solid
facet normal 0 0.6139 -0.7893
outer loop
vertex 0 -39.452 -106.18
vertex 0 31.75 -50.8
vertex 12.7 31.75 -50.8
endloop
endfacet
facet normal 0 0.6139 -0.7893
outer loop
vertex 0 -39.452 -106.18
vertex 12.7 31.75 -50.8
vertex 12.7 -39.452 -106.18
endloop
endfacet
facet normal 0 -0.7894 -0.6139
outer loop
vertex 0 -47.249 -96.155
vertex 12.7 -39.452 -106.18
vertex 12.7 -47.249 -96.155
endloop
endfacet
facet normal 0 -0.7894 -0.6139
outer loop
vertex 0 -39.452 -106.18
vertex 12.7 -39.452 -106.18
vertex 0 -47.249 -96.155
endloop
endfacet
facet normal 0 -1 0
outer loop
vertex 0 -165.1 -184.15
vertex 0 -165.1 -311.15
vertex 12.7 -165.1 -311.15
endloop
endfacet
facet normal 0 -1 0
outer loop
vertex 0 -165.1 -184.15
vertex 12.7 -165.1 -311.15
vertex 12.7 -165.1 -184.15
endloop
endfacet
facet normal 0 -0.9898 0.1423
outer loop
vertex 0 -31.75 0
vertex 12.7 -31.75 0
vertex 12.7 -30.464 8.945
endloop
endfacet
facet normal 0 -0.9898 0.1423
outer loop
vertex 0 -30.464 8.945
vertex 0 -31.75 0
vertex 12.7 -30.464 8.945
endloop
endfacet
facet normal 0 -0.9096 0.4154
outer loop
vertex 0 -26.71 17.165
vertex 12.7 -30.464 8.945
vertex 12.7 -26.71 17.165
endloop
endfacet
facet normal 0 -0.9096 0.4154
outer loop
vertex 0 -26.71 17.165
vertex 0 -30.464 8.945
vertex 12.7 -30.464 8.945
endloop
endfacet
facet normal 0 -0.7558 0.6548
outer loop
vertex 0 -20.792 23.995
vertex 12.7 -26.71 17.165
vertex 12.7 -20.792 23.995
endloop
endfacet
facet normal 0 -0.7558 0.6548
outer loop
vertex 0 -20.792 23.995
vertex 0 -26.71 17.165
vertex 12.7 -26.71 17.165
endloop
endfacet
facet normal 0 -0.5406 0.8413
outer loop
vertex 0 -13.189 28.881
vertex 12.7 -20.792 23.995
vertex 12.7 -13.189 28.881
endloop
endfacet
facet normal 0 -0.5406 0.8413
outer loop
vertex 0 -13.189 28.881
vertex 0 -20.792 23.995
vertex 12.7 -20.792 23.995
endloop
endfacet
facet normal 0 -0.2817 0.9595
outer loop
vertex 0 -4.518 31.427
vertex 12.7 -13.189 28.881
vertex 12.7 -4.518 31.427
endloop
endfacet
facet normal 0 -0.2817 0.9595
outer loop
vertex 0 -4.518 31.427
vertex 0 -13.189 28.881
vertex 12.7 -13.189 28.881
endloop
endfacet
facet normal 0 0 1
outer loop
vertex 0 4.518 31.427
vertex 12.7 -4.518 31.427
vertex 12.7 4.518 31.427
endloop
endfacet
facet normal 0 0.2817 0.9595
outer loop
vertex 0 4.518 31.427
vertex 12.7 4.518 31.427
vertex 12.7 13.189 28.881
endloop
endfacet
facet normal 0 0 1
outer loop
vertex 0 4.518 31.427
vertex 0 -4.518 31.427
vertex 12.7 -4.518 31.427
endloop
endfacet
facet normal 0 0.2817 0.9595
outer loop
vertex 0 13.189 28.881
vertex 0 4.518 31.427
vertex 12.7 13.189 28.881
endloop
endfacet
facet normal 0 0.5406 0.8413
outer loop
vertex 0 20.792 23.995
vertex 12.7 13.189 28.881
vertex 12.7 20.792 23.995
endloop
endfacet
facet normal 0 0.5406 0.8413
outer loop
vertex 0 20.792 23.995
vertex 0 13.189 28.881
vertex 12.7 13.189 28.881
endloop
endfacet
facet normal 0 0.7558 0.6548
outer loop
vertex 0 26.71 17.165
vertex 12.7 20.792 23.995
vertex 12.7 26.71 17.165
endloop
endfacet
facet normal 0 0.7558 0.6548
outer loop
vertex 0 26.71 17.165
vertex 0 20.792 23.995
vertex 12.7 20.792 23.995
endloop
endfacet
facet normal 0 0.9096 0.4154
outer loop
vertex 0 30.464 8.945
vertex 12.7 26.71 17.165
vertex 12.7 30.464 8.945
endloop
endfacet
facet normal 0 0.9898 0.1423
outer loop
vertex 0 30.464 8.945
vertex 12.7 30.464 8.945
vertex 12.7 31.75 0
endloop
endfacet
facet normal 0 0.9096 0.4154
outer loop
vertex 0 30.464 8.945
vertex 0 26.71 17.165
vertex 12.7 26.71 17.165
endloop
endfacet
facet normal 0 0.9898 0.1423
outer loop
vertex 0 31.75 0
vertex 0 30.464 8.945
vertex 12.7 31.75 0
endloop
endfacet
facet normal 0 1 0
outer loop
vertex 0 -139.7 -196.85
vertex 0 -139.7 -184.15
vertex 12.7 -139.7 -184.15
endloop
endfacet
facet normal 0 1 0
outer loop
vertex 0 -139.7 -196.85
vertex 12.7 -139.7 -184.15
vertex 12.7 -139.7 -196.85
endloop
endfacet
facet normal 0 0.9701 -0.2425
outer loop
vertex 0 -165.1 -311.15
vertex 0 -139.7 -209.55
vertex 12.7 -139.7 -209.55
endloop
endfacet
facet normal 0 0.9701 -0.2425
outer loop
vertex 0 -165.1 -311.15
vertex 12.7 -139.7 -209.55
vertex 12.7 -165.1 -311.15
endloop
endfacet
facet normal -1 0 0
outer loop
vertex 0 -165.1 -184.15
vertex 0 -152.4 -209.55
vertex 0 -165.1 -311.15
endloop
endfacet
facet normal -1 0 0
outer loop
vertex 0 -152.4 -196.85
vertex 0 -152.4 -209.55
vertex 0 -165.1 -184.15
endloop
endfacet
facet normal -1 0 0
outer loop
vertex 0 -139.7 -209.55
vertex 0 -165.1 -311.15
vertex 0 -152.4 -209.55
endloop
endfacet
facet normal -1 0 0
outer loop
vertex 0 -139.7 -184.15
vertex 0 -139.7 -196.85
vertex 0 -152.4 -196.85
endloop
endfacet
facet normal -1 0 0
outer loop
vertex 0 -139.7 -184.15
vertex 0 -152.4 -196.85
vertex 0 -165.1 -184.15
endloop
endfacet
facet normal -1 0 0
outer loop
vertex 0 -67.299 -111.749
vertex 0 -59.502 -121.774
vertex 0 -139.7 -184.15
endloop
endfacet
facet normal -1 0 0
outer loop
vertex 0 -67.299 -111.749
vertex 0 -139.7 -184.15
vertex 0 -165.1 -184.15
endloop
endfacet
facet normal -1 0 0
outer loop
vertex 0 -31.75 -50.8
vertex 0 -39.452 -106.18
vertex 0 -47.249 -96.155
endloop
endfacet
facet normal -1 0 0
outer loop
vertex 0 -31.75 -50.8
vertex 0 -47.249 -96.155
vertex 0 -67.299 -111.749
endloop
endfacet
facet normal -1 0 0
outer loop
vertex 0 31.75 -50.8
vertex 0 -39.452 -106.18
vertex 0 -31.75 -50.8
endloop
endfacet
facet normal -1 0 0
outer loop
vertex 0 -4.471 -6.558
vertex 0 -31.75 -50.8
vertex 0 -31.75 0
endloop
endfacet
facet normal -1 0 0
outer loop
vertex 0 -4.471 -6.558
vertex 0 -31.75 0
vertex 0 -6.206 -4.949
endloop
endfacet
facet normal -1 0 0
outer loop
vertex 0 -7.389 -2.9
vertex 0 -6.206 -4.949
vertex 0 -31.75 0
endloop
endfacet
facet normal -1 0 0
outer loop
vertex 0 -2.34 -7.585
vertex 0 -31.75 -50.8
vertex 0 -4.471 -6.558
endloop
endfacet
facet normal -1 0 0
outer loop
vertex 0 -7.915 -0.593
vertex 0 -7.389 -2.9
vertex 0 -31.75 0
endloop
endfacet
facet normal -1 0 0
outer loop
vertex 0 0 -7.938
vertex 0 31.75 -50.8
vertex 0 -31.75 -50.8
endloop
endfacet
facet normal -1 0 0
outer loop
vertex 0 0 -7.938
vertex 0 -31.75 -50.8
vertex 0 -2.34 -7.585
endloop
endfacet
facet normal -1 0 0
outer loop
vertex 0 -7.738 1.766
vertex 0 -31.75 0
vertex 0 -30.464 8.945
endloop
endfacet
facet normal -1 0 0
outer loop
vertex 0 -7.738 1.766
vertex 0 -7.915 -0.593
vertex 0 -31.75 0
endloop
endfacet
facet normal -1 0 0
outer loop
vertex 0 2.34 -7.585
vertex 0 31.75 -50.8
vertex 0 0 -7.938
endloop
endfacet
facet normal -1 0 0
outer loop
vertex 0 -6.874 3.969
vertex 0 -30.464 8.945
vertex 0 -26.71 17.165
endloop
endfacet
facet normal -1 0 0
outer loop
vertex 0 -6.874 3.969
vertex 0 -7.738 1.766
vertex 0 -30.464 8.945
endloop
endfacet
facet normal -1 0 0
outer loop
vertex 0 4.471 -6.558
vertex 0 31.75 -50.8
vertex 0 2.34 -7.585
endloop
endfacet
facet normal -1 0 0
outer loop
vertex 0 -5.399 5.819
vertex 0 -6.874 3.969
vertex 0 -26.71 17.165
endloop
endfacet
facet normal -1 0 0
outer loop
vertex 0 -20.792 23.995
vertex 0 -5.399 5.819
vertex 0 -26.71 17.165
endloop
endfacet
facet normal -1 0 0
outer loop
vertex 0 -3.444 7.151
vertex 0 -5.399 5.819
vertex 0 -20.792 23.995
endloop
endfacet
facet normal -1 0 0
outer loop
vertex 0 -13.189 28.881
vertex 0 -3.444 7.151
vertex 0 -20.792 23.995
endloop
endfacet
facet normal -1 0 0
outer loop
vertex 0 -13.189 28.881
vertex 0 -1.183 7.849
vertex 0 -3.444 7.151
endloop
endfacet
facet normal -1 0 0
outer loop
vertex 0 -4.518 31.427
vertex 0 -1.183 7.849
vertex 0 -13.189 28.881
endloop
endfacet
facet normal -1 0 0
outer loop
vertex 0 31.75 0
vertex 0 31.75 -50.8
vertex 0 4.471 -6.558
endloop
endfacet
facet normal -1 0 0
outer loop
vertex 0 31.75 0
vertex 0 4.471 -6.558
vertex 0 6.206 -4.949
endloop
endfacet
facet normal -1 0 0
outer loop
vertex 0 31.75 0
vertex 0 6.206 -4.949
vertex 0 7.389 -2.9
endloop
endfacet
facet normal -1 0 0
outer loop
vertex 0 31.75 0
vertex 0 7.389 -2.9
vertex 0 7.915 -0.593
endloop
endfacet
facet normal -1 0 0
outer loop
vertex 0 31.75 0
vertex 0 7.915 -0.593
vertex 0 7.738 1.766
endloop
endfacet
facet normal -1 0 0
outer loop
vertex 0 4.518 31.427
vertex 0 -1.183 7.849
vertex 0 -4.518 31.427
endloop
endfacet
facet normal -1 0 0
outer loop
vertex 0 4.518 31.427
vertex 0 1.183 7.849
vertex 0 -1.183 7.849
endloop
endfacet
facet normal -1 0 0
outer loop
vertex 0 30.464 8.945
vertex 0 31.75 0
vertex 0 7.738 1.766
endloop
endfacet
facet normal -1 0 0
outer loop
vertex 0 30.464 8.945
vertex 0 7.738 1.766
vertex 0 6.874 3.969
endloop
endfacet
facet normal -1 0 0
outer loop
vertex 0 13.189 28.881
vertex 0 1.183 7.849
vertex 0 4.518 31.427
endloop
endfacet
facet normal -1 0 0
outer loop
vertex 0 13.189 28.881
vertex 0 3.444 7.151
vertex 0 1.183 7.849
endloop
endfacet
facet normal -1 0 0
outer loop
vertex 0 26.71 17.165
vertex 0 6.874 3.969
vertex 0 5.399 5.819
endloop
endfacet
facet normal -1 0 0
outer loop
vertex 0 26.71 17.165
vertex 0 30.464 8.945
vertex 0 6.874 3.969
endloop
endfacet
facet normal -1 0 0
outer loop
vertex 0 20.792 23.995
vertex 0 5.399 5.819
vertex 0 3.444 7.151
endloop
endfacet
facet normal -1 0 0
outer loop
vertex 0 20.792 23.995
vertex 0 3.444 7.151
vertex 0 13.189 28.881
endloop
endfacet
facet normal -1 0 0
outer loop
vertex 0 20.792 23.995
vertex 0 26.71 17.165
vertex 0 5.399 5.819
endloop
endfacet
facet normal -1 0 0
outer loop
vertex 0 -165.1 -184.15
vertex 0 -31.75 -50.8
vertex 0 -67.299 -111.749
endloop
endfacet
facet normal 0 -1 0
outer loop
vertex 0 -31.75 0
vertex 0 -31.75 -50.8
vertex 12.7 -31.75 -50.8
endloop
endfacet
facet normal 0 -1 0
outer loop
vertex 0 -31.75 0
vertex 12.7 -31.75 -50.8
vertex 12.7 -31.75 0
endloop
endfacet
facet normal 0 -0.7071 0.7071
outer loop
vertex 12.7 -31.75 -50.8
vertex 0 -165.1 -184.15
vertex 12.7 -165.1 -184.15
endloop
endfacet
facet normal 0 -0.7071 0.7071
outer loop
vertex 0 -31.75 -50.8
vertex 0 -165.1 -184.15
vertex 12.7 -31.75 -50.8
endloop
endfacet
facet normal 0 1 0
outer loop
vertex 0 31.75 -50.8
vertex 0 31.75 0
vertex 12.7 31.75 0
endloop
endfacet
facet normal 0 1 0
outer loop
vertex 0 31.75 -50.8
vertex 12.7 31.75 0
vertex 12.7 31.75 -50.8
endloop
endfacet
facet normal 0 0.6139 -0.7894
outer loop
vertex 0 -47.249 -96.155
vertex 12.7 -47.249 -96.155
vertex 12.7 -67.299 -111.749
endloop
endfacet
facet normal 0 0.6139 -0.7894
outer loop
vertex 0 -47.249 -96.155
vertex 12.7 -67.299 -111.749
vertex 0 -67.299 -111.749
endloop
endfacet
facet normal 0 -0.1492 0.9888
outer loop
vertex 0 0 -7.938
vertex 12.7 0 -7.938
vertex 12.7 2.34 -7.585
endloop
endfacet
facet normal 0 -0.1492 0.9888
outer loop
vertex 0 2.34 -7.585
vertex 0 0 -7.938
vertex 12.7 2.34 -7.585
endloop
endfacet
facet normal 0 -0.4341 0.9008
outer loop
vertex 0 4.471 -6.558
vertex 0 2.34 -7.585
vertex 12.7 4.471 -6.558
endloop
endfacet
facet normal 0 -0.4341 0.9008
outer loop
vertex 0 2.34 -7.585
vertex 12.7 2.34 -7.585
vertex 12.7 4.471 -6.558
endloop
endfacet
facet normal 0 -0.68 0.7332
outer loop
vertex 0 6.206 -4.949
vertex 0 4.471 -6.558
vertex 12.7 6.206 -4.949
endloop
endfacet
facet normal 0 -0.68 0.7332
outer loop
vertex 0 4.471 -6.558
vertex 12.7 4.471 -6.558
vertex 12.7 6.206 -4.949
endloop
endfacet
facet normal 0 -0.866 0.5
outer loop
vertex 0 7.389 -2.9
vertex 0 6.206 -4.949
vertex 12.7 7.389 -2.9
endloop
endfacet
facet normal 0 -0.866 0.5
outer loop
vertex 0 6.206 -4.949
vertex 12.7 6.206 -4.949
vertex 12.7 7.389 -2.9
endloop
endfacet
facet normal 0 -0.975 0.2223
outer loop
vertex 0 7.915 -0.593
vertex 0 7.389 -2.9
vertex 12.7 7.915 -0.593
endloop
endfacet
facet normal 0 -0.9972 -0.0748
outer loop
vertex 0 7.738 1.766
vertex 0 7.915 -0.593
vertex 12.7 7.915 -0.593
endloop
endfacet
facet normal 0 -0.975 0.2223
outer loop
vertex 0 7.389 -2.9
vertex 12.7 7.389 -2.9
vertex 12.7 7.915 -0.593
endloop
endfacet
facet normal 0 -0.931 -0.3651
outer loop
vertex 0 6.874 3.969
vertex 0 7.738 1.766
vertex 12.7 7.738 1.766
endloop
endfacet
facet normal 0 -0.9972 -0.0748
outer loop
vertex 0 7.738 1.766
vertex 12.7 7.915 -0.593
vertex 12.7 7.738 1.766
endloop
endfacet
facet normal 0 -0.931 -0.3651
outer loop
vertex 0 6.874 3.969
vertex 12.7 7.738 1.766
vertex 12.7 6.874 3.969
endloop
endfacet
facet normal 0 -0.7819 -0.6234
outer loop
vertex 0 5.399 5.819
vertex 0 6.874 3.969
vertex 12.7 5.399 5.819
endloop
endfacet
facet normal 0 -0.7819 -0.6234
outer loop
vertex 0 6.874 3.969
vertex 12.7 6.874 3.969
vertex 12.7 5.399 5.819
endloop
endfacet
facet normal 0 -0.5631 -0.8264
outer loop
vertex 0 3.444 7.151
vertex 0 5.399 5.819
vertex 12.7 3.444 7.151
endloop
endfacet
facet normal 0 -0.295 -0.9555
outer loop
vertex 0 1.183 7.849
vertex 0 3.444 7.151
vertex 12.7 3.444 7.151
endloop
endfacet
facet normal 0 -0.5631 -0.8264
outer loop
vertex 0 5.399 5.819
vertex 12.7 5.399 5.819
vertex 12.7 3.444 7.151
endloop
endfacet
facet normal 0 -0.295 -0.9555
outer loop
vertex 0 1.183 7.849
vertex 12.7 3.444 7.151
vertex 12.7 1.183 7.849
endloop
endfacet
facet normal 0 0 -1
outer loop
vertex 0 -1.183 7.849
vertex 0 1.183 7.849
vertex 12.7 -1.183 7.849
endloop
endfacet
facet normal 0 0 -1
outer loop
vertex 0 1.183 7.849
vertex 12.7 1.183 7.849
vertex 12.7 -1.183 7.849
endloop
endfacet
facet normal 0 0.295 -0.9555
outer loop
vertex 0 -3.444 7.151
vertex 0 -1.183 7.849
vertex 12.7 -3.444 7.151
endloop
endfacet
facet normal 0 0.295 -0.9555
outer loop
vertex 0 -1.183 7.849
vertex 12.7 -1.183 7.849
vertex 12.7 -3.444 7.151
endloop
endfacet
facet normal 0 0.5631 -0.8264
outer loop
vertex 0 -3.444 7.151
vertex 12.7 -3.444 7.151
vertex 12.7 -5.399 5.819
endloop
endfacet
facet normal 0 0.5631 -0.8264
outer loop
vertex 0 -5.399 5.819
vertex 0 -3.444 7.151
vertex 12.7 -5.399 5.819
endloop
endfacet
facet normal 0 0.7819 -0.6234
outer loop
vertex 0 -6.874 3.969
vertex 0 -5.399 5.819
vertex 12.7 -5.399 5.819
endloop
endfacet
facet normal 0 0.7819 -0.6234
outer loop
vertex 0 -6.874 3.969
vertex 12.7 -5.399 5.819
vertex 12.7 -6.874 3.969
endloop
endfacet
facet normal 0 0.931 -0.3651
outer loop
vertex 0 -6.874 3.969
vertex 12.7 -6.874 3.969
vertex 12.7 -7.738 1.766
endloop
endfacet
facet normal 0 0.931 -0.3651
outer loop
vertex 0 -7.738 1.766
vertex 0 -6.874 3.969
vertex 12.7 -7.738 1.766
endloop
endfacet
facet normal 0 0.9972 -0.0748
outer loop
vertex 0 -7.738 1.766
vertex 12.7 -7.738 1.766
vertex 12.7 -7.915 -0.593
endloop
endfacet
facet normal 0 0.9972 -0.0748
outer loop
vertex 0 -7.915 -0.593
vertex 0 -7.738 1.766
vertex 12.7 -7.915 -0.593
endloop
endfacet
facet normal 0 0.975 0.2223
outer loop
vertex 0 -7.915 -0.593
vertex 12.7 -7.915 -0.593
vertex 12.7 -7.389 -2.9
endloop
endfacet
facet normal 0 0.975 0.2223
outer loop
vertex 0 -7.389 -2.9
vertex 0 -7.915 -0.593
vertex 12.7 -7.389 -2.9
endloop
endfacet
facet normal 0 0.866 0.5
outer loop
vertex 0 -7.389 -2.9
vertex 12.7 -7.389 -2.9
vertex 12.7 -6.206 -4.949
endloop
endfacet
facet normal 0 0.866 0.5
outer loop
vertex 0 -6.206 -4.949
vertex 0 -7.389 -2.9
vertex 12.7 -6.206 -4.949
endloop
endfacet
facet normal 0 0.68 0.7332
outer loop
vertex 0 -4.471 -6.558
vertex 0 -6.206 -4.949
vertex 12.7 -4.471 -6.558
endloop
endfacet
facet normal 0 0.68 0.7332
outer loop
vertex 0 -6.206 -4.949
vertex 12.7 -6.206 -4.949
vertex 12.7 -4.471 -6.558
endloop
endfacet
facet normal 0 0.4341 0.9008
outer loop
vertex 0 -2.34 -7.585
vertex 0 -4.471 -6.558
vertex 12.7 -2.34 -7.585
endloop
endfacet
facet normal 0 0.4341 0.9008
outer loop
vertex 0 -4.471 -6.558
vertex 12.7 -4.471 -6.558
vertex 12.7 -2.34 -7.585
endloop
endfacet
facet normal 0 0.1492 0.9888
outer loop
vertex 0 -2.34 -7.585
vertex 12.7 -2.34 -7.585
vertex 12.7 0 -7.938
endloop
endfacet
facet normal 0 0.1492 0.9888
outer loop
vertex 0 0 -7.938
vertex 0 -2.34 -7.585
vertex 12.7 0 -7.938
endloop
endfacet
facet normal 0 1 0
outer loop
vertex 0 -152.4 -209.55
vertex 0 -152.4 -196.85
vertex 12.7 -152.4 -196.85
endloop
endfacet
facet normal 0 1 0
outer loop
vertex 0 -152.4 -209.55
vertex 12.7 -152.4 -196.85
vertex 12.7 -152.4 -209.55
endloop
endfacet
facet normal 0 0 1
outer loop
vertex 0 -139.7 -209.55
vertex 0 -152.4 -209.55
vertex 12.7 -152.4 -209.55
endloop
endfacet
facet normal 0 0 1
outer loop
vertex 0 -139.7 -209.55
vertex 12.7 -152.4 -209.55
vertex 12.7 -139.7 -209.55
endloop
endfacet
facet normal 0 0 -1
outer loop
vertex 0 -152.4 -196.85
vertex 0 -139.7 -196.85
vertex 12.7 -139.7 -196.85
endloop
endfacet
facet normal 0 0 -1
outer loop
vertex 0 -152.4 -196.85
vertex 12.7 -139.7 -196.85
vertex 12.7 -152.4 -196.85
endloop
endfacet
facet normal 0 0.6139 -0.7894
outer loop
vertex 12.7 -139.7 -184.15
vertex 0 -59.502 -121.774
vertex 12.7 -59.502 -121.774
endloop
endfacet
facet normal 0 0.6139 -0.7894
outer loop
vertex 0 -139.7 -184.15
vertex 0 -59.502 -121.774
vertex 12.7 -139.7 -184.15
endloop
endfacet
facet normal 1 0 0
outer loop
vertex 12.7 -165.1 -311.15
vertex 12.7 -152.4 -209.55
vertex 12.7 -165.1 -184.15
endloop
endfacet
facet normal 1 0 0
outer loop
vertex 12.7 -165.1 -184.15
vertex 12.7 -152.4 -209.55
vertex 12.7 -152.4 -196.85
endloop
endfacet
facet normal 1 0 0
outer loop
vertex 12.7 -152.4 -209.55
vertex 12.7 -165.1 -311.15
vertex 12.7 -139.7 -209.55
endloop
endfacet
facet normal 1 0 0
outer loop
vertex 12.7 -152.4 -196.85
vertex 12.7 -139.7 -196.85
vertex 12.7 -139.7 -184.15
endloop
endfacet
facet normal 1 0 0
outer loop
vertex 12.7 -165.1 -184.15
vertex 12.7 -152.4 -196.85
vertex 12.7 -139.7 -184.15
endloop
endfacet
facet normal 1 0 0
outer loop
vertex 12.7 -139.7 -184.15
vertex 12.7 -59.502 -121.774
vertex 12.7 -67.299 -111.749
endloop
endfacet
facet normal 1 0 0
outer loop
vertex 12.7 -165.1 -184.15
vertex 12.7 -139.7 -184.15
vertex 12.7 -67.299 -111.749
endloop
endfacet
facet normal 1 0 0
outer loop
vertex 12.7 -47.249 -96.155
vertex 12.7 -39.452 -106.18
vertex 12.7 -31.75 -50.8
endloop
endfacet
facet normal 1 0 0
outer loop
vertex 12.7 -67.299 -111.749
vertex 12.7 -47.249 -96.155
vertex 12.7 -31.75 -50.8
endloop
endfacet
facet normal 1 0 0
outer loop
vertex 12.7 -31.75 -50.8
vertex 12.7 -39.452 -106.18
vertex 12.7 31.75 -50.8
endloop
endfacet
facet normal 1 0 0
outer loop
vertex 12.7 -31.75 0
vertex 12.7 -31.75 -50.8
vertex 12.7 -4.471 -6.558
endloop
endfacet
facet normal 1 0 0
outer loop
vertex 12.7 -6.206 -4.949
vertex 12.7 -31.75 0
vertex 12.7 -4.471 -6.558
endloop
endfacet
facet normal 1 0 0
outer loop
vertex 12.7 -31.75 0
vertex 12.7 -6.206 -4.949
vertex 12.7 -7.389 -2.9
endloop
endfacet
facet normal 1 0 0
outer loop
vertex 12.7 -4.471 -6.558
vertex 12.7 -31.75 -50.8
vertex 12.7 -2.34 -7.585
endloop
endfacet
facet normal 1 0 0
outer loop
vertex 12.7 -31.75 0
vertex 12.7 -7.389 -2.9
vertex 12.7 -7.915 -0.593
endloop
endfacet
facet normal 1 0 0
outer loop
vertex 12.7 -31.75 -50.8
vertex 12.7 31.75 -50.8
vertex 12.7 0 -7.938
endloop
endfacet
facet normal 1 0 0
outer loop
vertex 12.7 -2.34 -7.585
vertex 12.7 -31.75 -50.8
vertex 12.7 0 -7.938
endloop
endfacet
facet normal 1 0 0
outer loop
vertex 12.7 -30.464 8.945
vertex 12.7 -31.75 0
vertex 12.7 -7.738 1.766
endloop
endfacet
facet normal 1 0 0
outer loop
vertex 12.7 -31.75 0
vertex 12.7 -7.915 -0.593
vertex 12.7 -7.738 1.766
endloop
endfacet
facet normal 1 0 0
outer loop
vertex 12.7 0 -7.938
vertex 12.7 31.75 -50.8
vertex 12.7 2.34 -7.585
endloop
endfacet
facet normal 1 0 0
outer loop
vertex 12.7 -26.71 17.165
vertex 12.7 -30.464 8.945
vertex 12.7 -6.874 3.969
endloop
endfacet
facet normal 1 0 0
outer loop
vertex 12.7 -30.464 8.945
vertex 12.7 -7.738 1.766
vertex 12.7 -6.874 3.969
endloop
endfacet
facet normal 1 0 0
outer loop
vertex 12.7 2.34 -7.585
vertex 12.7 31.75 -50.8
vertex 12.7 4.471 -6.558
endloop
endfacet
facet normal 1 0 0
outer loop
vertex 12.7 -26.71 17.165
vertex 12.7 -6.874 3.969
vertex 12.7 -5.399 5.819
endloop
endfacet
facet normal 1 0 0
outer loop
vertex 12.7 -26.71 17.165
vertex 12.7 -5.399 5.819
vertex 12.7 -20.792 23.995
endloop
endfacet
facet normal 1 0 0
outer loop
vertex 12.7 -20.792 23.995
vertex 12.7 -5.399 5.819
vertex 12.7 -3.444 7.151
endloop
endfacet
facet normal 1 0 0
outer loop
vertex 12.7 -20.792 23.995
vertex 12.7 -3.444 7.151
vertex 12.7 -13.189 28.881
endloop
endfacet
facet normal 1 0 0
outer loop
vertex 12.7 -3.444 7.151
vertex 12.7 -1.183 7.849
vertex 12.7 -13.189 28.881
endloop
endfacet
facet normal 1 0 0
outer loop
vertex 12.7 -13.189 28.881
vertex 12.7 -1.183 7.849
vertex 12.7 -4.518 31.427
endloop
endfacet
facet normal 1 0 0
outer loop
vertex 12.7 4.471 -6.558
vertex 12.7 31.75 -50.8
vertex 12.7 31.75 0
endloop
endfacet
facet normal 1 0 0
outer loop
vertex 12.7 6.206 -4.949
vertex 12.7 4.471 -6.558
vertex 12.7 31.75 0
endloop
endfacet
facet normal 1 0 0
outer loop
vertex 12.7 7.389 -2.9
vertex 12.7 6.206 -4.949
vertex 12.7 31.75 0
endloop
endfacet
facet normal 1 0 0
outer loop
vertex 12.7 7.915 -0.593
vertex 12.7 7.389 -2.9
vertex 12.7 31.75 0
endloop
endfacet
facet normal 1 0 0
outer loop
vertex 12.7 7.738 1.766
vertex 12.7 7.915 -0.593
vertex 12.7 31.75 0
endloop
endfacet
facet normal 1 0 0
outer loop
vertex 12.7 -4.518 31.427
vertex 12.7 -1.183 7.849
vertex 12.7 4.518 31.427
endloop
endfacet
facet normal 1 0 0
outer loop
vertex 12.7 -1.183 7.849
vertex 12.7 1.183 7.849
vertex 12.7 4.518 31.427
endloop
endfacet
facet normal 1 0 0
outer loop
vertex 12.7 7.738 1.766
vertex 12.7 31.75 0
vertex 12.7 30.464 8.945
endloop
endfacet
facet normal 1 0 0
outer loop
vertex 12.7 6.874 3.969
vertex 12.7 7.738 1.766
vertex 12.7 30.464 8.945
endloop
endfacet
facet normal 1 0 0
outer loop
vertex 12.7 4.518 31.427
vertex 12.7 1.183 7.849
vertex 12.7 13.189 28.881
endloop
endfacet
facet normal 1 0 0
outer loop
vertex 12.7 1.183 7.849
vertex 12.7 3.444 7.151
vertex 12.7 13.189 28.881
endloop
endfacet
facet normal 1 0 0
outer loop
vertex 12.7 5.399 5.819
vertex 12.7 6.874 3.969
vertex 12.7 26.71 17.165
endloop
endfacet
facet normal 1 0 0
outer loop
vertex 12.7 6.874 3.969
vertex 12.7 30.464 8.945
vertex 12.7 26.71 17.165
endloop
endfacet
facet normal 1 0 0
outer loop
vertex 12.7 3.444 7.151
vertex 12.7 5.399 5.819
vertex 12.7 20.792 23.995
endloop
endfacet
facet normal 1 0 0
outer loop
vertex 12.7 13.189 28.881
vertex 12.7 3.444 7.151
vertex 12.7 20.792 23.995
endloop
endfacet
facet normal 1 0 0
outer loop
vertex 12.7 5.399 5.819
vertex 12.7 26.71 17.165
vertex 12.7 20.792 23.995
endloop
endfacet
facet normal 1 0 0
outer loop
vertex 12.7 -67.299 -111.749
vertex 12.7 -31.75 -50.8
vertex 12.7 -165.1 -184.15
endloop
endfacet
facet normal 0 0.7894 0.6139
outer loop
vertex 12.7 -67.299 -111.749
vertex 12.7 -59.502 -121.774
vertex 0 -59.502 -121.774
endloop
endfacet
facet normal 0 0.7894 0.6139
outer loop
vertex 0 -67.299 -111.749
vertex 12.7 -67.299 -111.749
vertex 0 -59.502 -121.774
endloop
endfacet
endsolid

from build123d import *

# Parameters (mm, degrees)
MAIN_DEPTH    = 12.7
SKETCH2_R     = 7.9375
AXLE_DEPTH    = 12.7
SKETCH5_W     = 12.7
SKETCH5_H     = 25.4
BARWIDE_DEPTH = 12.7


with BuildPart() as part:
    # Sketch1 → main (new body)
    with BuildSketch(Plane(origin=(0, 0, 0), x_dir=(0, 0, -1), z_dir=(1, 0, 0))):
        with BuildLine():
            Line((0, 31.75), (50.8, 31.75))
            Line((50.8, 31.75), (184.15, -139.7))
            Line((184.15, -139.7), (196.85, -139.7))
            Line((196.85, -139.7), (196.85, -152.4))
            Line((196.85, -152.4), (209.55, -152.4))
            Line((209.55, -152.4), (209.55, -139.7))
            Line((209.55, -139.7), (311.15, -165.1))
            Line((311.15, -165.1), (184.15, -165.1))
            Line((184.15, -165.1), (50.8, -31.75))
            Line((50.8, -31.75), (0, -31.75))
            ThreePointArc((0, -31.75), (-31.75, 0), (0, 31.75))
        make_face()
    extrude(amount=MAIN_DEPTH)

    # Sketch2 → axle (cut)
    with BuildSketch(Plane(origin=(12.7, 0, 0), x_dir=(0, 0, -1), z_dir=(1, 0, 0))):
        Circle(SKETCH2_R)
    extrude(amount=-AXLE_DEPTH, mode=Mode.SUBTRACT)

    # Sketch5 → barwide (cut)
    with BuildSketch(Plane(origin=(0, 36.585769231, -47.038846154), x_dir=(-1, 0, 0), z_dir=(0, 0.6139406135149222, -0.789352217376325))):
        with Locations((-6.35, -109.029668746)):
            Rectangle(SKETCH5_W, SKETCH5_H)
    extrude(amount=-BARWIDE_DEPTH, mode=Mode.SUBTRACT)


solid = part.part
